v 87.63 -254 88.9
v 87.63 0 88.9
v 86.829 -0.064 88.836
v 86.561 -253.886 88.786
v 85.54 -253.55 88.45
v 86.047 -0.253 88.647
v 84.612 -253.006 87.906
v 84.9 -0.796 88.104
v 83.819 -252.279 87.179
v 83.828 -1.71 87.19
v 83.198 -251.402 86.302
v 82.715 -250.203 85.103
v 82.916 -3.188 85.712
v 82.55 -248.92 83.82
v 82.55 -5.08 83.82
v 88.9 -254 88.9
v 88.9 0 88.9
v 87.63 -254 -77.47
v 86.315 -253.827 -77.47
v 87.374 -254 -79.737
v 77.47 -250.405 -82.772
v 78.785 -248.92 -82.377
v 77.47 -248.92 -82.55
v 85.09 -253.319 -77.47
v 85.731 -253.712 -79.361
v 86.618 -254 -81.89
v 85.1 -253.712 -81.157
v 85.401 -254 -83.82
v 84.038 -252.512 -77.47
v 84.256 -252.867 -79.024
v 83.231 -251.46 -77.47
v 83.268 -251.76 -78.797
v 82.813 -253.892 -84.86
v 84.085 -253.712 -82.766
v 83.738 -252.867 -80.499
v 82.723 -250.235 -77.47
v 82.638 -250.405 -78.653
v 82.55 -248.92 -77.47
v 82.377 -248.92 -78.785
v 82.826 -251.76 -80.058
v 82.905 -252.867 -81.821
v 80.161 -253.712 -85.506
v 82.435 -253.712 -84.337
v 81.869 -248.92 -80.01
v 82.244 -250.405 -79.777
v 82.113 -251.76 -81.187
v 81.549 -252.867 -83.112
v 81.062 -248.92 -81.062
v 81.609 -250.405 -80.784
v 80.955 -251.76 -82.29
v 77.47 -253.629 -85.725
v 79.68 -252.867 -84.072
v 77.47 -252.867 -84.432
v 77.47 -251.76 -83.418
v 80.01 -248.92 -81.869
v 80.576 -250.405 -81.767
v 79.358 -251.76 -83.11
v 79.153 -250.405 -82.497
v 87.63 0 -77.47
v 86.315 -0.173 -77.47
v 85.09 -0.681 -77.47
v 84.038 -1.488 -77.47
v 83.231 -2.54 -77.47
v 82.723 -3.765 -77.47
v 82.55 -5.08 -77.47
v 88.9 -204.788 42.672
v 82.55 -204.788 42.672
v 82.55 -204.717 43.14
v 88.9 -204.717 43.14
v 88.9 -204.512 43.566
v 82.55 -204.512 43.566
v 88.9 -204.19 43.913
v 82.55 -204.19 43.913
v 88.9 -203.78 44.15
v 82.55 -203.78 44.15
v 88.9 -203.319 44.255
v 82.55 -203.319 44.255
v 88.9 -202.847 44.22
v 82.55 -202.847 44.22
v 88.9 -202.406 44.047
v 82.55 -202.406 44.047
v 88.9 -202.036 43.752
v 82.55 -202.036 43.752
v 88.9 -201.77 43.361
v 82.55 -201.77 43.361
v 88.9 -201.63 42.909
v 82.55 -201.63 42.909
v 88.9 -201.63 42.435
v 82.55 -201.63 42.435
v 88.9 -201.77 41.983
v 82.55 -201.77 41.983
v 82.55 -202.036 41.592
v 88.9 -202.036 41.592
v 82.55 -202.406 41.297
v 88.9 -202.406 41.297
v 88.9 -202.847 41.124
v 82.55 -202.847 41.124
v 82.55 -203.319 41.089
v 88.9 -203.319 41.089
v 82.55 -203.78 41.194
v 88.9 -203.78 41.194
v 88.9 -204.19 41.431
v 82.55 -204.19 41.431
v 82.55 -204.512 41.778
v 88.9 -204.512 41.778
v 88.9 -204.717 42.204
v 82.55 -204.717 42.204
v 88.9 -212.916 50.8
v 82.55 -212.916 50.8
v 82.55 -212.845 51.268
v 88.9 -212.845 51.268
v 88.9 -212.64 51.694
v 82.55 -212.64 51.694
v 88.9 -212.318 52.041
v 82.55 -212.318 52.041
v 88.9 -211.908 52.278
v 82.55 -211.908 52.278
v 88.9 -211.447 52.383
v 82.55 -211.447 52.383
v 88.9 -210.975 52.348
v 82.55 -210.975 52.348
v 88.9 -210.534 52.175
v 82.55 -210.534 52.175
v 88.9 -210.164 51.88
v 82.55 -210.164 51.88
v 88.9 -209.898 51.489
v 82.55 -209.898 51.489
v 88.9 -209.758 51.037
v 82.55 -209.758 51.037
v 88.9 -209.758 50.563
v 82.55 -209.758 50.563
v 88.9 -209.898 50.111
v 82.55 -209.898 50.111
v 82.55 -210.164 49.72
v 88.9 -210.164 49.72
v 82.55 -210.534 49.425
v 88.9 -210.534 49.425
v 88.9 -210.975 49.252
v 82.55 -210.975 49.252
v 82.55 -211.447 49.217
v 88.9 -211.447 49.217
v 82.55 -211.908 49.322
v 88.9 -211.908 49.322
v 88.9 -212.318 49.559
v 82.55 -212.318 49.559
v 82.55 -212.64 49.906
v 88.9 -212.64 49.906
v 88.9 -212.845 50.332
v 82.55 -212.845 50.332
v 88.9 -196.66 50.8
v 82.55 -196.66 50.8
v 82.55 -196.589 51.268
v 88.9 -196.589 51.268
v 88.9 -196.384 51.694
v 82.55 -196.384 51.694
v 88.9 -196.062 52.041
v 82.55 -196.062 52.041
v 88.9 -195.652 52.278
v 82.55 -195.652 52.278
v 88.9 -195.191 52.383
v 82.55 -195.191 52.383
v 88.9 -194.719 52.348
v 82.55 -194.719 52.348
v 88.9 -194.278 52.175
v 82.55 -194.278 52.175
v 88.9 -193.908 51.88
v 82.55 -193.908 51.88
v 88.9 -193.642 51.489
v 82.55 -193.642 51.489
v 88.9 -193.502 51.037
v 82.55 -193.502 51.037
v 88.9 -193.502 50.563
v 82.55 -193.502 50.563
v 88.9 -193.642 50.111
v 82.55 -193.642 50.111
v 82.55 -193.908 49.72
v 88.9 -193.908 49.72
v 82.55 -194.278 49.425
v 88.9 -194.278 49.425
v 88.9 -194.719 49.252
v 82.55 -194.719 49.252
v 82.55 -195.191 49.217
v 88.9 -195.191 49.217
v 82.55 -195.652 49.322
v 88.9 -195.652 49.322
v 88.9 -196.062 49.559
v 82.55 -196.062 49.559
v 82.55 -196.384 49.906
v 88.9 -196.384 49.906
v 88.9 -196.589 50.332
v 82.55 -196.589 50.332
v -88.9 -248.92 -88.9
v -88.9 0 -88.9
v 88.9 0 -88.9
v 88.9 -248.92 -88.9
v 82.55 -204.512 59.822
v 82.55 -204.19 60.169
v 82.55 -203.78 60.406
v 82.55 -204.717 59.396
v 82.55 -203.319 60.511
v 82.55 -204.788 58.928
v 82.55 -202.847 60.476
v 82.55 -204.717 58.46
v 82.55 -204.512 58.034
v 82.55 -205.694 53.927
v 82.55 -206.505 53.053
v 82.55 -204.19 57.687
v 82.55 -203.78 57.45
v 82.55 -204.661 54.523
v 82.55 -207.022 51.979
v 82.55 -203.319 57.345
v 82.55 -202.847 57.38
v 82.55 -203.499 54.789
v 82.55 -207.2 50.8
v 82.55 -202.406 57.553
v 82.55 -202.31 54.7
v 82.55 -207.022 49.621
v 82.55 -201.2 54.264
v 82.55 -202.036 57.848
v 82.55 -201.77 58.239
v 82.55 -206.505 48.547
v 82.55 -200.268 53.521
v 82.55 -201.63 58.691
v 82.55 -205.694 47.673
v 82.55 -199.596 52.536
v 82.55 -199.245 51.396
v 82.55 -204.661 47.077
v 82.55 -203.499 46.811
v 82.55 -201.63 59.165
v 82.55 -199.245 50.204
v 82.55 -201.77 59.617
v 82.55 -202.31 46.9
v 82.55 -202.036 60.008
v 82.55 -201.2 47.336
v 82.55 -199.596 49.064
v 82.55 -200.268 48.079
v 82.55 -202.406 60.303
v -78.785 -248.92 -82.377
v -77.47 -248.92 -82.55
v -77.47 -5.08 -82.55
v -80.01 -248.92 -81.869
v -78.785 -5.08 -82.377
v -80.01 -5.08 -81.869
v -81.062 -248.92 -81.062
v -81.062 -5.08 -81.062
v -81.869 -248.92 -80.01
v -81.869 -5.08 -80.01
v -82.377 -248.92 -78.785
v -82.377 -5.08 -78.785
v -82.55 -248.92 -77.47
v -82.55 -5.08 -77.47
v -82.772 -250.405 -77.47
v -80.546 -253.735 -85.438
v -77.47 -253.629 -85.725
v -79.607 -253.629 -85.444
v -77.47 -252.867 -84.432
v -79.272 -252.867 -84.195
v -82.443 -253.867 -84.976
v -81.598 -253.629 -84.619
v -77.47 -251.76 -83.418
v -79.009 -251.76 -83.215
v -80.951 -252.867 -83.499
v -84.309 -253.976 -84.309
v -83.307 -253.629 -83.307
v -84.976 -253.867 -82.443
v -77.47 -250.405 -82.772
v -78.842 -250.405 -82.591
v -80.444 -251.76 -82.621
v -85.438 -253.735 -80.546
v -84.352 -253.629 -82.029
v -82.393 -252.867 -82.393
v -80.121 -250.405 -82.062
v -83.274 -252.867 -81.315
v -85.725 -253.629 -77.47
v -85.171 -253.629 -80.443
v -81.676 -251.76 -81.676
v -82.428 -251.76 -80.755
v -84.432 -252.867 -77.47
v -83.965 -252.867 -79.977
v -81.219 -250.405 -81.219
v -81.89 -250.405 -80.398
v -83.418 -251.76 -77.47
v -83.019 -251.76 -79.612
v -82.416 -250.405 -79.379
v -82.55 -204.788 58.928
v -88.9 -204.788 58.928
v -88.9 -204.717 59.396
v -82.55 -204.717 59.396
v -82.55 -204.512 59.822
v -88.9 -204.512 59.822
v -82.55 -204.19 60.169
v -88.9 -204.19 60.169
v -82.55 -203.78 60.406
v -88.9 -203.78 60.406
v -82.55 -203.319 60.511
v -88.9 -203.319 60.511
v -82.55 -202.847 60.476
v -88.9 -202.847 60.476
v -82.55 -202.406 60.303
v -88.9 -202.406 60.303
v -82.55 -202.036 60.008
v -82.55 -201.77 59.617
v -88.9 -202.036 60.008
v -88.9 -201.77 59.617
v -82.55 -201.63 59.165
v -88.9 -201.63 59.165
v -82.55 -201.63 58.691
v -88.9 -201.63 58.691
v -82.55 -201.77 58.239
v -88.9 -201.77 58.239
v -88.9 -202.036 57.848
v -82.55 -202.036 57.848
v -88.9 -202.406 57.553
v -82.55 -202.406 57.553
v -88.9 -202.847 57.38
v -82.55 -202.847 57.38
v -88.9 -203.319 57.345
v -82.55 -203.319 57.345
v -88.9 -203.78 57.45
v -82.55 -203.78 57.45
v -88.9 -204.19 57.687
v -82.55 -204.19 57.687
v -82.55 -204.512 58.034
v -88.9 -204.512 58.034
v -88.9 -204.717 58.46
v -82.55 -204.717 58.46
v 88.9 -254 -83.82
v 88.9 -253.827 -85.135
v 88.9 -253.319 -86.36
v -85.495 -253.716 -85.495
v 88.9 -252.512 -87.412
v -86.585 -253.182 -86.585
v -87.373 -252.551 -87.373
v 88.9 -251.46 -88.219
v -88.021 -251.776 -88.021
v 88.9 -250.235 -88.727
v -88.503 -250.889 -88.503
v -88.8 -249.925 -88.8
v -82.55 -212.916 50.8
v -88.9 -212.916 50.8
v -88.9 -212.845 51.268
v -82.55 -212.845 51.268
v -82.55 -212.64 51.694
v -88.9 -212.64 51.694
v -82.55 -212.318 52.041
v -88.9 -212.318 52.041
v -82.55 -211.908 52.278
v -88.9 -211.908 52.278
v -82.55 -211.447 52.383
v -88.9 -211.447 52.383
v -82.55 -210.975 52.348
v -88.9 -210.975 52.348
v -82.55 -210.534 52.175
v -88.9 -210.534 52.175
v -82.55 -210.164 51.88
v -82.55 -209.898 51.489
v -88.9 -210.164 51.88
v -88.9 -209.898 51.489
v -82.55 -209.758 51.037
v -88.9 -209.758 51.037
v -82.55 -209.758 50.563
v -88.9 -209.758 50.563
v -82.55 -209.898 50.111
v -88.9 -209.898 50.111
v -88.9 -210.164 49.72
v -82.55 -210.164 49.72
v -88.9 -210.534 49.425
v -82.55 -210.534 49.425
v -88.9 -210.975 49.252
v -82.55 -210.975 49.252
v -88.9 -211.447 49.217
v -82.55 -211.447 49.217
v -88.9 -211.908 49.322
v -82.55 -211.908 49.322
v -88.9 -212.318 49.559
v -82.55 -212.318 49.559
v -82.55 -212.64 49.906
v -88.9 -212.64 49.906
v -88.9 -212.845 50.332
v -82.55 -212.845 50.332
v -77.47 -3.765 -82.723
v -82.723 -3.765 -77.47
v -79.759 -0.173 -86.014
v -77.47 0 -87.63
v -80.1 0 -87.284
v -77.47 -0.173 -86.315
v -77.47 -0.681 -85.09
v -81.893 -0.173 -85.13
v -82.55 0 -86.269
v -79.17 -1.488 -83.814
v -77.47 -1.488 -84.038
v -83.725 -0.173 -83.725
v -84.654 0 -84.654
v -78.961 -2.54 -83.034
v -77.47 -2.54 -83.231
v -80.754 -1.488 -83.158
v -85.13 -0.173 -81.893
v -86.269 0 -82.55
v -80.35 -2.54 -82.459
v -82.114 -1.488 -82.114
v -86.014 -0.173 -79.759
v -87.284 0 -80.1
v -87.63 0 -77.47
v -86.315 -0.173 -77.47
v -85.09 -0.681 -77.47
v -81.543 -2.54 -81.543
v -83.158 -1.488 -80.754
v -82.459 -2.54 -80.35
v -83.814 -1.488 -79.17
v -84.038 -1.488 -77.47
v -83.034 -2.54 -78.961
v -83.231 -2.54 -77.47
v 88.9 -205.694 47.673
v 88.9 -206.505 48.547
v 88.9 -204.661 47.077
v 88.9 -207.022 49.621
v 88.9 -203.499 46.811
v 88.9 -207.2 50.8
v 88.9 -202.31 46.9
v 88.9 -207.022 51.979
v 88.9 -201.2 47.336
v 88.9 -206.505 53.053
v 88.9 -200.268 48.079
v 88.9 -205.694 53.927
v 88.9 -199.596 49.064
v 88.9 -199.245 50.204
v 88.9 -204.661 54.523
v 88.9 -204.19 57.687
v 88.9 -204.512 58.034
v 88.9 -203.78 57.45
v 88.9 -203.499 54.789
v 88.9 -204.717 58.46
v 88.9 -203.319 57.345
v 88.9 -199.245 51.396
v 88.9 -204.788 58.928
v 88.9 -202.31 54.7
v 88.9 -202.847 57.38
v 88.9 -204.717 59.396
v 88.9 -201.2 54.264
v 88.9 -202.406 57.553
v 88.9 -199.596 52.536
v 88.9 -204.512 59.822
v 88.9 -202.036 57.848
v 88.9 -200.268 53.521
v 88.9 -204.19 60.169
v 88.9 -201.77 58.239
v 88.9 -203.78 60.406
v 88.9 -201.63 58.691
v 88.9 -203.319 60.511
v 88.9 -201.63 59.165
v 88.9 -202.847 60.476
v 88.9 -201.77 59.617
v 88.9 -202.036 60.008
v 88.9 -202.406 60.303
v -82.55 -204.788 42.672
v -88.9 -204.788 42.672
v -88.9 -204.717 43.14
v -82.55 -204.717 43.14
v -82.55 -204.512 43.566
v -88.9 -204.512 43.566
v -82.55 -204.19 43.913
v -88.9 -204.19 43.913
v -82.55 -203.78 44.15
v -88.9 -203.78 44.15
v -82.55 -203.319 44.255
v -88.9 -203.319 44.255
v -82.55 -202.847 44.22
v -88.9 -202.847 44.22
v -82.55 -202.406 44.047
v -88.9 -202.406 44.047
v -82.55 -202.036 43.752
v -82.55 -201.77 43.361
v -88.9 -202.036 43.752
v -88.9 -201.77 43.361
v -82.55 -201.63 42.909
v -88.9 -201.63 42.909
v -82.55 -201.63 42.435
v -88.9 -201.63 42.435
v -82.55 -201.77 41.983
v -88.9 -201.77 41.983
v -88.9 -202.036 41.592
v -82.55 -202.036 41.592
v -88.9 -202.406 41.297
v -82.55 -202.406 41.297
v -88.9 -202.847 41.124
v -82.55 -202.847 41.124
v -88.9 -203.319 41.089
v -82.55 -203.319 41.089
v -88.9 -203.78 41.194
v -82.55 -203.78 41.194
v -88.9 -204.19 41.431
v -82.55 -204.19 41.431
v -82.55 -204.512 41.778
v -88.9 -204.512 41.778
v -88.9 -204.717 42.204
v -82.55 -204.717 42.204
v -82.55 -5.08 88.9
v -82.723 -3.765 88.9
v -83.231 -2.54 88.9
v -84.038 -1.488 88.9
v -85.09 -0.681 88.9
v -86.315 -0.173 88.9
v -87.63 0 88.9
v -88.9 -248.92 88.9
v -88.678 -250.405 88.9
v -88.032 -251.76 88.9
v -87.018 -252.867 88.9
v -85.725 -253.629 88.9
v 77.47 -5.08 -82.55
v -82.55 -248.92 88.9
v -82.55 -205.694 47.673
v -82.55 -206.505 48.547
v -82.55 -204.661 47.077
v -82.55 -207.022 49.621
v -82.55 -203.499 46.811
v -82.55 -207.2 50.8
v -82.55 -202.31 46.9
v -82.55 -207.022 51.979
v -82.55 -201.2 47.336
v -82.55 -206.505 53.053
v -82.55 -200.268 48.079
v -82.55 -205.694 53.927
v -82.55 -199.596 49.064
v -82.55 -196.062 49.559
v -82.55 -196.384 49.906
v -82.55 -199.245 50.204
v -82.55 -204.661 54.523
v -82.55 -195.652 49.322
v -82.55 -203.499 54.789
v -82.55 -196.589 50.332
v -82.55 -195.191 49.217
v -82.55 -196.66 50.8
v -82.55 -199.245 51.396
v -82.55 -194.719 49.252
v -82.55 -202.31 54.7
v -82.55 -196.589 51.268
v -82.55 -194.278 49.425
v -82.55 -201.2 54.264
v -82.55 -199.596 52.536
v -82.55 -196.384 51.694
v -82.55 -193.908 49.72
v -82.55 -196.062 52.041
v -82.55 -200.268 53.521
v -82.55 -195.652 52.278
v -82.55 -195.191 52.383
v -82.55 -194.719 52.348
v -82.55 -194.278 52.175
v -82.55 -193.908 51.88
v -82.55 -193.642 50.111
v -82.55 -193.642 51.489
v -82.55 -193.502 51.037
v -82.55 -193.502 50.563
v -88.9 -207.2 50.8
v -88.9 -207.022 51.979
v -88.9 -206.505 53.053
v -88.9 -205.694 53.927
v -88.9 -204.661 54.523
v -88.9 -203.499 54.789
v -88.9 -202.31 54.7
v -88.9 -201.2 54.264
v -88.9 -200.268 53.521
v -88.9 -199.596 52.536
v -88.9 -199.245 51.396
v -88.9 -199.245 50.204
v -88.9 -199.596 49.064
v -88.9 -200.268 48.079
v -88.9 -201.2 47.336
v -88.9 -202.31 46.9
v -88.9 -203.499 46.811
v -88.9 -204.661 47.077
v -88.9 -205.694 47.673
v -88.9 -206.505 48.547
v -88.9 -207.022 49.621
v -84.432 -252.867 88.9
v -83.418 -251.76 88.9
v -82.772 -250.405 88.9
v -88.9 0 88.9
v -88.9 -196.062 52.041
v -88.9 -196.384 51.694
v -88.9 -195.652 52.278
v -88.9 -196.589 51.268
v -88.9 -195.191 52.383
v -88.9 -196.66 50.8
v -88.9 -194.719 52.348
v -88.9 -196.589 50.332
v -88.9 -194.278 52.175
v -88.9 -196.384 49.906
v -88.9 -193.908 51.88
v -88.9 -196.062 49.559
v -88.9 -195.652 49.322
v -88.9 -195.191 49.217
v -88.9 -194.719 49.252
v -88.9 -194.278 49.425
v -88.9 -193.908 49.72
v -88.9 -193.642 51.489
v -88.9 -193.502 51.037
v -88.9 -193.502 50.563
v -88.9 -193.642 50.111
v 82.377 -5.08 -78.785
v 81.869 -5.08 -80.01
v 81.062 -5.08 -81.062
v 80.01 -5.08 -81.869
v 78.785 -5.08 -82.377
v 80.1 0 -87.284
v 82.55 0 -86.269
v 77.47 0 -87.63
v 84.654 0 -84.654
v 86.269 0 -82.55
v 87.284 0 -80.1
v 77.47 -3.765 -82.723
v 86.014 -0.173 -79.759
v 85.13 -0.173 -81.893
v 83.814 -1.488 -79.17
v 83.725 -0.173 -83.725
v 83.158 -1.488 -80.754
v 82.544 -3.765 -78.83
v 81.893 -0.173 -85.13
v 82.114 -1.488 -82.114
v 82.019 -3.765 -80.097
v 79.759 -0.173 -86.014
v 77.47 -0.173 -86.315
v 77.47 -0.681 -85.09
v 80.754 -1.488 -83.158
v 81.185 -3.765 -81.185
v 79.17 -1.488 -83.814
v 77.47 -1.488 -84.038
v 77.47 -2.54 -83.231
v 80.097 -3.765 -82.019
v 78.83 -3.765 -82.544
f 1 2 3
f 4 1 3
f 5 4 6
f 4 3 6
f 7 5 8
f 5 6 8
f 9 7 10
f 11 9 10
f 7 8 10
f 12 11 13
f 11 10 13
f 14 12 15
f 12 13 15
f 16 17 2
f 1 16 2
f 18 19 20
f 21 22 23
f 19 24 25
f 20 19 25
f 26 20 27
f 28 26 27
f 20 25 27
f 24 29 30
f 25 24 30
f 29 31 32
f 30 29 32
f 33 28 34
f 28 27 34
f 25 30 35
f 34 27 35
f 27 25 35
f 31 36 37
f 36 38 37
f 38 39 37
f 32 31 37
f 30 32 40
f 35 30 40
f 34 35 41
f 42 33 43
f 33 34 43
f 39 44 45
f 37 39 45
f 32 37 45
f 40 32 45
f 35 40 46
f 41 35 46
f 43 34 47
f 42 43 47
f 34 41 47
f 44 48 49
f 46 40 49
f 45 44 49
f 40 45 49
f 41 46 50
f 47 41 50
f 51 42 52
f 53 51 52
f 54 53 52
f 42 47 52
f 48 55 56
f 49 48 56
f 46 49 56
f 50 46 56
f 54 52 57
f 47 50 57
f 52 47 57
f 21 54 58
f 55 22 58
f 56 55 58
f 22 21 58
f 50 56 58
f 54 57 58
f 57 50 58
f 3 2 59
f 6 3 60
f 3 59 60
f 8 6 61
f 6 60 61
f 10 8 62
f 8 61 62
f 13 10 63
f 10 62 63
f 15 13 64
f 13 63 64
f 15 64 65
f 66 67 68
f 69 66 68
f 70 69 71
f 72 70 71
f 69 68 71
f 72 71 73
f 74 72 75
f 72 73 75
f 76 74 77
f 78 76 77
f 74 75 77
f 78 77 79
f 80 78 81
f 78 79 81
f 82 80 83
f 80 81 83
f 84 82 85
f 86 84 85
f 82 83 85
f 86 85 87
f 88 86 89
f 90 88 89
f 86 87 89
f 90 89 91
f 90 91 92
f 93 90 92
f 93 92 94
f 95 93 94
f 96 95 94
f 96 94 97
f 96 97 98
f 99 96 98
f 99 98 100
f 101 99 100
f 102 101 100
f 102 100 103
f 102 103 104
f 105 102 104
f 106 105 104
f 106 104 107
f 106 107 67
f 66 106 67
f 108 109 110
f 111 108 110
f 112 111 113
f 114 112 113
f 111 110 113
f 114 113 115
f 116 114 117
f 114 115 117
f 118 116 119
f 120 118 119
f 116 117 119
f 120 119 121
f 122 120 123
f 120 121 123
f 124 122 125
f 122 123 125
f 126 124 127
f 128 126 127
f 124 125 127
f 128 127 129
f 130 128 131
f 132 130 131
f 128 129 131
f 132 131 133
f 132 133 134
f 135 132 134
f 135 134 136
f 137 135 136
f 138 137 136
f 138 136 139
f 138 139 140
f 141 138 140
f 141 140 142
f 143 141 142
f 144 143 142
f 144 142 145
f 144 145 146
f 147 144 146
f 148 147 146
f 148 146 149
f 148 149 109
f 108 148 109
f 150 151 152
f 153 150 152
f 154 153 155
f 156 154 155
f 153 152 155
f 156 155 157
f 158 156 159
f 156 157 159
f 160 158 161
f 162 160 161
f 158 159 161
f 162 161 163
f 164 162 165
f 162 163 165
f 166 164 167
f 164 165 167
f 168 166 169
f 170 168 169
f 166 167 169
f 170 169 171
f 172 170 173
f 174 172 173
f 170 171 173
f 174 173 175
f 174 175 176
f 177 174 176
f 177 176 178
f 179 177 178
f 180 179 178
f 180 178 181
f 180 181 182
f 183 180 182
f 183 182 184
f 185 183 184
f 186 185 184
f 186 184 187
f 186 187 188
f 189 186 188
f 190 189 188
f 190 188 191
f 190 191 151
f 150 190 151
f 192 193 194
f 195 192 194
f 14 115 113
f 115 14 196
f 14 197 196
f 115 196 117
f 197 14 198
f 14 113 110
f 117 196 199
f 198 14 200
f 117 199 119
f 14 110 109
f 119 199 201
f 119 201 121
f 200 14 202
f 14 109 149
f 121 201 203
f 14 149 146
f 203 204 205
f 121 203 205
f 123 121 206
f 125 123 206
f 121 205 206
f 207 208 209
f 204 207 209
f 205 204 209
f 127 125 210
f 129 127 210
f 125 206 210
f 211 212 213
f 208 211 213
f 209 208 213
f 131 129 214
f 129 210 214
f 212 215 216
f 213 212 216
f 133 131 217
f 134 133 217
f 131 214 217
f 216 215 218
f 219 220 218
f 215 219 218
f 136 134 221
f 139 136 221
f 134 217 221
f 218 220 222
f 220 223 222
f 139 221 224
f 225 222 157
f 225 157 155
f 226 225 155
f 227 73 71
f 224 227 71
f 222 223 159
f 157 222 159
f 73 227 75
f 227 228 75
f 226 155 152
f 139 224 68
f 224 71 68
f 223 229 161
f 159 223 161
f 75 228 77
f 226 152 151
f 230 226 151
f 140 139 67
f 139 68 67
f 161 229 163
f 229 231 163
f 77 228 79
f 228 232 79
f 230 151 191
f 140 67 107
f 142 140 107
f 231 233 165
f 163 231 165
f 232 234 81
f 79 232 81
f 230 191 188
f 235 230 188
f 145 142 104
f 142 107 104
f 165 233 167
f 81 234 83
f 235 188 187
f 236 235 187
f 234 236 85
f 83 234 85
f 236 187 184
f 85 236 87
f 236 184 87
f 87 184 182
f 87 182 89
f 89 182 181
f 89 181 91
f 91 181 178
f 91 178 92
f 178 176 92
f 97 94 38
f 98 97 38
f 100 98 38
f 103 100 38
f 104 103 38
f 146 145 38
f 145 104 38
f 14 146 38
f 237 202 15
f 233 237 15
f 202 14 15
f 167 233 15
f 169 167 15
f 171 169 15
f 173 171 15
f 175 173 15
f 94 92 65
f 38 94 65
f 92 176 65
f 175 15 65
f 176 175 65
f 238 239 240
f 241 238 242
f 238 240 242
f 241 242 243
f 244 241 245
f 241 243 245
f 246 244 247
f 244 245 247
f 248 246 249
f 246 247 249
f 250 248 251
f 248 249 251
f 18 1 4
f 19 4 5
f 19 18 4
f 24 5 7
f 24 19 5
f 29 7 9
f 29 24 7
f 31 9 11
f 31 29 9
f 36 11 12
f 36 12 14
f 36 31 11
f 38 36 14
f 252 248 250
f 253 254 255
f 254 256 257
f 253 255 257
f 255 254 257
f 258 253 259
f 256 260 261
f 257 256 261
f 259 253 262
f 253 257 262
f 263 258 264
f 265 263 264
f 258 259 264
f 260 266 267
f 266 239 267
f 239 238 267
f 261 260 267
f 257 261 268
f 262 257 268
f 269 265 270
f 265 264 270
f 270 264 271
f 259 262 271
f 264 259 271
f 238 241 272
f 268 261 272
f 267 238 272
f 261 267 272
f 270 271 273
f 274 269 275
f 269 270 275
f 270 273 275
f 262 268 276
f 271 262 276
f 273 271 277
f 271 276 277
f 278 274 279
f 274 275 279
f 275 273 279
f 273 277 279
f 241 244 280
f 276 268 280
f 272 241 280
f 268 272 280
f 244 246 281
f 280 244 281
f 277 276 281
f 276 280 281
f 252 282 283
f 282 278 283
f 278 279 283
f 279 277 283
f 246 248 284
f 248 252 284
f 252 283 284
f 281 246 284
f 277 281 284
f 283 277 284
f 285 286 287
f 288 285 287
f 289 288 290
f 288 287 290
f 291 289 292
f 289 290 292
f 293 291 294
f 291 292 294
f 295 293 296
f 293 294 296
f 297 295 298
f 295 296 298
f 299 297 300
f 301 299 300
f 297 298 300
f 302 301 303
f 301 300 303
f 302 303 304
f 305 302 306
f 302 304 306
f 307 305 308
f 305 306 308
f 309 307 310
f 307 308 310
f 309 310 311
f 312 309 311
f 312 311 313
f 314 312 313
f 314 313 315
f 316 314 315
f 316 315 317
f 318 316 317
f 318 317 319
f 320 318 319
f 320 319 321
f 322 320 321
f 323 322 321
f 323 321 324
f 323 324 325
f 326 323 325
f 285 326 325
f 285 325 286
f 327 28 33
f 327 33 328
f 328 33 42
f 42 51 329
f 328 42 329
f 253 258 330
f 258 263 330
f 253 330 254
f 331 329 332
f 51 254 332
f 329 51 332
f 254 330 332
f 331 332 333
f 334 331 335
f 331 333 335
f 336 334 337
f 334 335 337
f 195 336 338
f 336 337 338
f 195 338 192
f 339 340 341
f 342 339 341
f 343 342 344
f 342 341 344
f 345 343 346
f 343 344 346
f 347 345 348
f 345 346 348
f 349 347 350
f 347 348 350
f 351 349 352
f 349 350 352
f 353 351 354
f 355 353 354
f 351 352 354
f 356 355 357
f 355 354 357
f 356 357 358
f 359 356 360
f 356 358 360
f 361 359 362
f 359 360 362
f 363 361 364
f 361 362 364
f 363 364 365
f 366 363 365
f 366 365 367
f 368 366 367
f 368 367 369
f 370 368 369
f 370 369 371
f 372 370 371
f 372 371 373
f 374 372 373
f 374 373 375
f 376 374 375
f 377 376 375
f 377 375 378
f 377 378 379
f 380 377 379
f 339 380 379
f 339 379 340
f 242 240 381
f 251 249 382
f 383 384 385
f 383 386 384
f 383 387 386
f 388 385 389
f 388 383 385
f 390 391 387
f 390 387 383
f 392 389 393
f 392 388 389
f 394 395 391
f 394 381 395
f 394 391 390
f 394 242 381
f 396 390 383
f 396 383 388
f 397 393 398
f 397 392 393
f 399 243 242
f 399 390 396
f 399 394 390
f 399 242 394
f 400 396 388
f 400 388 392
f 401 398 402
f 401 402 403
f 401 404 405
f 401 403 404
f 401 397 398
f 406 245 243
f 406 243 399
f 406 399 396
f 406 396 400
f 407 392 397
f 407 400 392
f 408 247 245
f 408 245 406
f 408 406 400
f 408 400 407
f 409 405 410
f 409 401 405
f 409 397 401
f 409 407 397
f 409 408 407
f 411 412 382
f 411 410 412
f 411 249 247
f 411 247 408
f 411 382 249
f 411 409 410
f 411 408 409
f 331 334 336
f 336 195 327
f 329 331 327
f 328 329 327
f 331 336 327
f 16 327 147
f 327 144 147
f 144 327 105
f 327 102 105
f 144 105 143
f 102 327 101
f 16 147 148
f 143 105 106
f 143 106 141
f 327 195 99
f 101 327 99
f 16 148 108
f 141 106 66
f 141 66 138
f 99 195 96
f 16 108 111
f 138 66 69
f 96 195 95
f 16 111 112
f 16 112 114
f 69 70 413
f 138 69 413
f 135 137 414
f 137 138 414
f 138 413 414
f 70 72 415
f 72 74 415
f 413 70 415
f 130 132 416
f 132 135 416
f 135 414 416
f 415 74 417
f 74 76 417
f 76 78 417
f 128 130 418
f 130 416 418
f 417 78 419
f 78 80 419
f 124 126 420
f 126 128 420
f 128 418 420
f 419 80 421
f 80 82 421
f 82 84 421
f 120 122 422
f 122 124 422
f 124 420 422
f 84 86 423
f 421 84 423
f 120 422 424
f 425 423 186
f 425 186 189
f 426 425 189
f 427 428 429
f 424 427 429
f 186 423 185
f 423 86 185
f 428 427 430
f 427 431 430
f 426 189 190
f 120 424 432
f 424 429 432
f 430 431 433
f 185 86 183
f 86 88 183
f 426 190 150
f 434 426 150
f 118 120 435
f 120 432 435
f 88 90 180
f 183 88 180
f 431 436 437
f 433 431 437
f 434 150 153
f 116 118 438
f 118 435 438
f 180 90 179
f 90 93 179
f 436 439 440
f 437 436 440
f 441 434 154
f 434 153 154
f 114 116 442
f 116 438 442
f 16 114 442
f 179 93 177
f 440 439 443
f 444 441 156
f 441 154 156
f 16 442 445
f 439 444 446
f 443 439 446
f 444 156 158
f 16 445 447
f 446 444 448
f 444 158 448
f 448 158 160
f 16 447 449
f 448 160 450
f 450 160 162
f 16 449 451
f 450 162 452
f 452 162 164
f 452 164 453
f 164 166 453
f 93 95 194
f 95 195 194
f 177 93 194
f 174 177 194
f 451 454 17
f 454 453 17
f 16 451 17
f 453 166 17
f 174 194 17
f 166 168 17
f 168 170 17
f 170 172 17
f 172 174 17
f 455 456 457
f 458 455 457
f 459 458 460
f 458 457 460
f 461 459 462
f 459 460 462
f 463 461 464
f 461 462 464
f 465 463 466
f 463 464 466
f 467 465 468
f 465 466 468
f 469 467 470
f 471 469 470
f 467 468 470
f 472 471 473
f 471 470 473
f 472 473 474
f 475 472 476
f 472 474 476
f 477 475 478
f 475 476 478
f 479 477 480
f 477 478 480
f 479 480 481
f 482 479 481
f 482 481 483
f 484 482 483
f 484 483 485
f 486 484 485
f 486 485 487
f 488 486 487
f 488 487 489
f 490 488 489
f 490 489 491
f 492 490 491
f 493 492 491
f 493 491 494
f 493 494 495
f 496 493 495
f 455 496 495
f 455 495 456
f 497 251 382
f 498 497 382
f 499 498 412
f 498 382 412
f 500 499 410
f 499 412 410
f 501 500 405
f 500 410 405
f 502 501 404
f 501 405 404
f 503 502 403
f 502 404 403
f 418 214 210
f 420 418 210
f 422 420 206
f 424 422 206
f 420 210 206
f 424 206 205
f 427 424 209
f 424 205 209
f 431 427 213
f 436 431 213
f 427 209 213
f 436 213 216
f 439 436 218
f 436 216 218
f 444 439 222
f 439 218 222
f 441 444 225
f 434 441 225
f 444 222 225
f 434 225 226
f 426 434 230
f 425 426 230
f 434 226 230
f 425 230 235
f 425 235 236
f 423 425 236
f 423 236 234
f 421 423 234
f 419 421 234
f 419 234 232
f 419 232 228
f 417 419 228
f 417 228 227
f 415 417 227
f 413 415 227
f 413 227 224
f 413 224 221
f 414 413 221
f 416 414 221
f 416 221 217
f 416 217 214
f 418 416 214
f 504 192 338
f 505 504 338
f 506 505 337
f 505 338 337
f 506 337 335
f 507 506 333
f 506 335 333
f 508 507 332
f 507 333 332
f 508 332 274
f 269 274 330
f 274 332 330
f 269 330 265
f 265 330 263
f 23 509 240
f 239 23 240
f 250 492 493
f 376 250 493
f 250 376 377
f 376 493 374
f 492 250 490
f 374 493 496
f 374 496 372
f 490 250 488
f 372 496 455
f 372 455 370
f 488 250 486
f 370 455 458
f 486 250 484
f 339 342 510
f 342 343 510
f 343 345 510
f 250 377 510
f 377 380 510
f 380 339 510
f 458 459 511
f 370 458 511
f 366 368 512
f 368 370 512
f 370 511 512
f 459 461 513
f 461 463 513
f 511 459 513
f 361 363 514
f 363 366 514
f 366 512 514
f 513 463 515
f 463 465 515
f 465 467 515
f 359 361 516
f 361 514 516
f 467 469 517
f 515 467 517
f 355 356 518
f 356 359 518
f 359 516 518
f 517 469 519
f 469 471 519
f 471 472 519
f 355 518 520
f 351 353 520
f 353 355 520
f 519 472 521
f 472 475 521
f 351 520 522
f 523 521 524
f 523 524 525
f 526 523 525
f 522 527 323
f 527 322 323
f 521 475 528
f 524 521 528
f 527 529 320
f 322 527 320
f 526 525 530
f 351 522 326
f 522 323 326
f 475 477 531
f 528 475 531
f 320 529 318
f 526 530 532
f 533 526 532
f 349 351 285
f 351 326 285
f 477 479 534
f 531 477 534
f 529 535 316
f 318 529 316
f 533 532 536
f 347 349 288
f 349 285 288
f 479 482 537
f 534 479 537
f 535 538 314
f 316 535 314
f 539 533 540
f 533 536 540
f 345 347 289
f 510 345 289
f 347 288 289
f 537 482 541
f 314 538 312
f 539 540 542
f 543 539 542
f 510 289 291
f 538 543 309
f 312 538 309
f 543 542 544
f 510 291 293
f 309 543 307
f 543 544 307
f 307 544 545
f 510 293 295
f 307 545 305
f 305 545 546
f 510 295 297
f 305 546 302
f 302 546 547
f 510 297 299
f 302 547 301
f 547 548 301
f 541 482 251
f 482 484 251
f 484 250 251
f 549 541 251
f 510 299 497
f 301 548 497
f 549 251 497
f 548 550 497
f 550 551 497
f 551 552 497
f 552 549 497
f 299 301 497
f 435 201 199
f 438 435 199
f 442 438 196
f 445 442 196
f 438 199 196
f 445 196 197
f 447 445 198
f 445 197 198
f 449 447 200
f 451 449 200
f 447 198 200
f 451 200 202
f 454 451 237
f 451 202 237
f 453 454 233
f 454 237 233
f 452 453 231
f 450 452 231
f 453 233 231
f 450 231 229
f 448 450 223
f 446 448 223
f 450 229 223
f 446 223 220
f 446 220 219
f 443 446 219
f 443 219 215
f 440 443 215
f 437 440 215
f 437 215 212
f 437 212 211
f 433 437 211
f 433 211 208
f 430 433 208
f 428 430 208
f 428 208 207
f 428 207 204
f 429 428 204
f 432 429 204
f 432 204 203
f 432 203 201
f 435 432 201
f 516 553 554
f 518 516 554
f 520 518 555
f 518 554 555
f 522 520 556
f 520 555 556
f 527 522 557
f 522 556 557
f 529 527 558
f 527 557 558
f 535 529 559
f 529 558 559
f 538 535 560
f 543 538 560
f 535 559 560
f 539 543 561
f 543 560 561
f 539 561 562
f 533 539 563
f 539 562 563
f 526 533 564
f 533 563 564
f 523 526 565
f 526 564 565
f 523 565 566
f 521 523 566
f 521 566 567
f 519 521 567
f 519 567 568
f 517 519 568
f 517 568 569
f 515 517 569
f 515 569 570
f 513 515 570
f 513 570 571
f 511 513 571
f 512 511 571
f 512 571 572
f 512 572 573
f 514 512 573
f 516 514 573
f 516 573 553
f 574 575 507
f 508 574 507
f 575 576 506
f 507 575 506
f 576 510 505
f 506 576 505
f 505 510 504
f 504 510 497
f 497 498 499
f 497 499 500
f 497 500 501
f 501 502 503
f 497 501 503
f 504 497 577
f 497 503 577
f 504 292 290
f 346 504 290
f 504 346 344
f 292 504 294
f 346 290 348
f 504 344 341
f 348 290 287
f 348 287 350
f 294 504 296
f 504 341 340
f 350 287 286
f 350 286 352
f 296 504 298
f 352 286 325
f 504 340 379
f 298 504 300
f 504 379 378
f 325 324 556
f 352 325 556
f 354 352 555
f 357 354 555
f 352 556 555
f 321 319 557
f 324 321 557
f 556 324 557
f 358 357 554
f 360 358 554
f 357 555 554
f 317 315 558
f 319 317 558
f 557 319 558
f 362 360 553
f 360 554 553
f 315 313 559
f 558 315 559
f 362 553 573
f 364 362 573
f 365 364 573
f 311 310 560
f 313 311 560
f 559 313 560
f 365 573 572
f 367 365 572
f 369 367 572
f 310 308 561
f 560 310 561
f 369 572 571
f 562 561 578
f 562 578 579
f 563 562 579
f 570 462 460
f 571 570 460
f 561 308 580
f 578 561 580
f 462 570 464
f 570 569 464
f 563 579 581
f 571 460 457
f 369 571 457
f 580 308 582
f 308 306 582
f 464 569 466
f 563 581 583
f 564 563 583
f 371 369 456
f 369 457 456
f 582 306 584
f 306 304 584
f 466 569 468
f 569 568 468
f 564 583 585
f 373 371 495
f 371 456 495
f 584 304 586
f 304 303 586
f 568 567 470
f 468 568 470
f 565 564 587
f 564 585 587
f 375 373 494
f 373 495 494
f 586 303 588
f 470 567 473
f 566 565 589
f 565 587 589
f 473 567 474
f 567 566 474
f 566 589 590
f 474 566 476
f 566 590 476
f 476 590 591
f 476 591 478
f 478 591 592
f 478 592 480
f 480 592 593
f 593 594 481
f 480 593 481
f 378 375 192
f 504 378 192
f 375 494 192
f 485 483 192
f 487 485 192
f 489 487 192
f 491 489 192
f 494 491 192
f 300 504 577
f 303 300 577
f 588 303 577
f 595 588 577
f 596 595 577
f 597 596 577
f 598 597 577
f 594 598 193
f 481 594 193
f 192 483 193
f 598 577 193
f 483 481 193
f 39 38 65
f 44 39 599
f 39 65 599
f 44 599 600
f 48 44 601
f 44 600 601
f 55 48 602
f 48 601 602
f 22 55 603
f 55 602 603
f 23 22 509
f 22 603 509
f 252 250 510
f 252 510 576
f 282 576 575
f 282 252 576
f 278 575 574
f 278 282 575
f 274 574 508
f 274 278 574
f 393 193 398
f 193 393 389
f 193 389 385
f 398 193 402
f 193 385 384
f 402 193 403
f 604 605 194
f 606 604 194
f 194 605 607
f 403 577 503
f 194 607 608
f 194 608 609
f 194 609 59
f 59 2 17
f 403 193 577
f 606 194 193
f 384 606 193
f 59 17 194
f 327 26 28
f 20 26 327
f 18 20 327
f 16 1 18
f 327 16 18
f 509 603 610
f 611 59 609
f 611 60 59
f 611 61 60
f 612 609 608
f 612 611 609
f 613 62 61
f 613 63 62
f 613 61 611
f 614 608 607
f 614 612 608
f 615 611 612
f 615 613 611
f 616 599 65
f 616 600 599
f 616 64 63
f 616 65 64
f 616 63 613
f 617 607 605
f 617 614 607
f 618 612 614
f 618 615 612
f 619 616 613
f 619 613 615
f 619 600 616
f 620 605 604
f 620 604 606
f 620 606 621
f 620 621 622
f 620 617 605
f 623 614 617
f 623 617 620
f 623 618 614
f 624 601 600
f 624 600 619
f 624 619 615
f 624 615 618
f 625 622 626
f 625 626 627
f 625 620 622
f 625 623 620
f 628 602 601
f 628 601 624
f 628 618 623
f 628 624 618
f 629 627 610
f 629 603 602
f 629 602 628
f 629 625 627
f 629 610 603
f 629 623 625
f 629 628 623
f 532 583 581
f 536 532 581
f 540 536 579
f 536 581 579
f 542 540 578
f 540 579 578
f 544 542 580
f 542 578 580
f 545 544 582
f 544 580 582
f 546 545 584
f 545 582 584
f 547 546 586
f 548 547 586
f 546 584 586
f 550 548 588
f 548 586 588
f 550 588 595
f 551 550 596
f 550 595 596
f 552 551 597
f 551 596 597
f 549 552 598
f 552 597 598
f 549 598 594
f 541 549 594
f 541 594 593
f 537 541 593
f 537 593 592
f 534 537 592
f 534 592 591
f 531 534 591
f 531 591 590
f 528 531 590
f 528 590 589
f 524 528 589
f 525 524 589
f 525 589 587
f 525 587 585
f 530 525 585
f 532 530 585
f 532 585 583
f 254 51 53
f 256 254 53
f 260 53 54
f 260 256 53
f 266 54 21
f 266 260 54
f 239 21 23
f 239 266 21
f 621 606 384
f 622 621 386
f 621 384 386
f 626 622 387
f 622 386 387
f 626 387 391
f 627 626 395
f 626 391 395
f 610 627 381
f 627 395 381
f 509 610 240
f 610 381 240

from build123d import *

# Parameters (mm, degrees)
F1_DEPTH     = 254
F2_T1_DEPTH  = 254
F2_T3_DEPTH  = 203.2
F2_T5_DEPTH  = 179.07
F2_T7_DEPTH  = 279.4
F2_T9_DEPTH  = 154.94
F2_T11_DEPTH = 203.2
F2_T14_ANGLE = 90
F2_T16_ANGLE = 90
F2_T18_ANGLE = 90
F2_T20_ANGLE = 90
F3_R         = 4.0000047
F3_R_2       = 1.5875
F4_DEPTH     = 203.2


# Not quite as in the source:
# - a fillet or chamfer that OpenCascade refuses, or shapes differently, is made with other operations: its cross-section is extruded or revolved along the edge and cut away or added


with BuildPart() as f1:
    # F0 (on Front) → F1 (new body)
    with BuildSketch(Plane.XZ):
        Polygon((-88.9, -88.9), (88.9, -88.9), (88.9, 88.9), (82.55, 88.9), (82.55, -82.55), (-82.55, -82.55), (-82.55, 88.9), (-88.9, 88.9), align=None)
    extrude(amount=F1_DEPTH)

    # F2: fillet of radius 5.08 on 11 edges, made by hand

    # F2_s2 → F2_t1 (join)
    with BuildSketch(Plane.XZ):
        with BuildLine():
            ThreePointArc((82.55, -77.47), (81.0621024484, -81.0621024484), (77.47, -82.55))
            Line((77.47, -82.55), (82.55, -82.55))
            Line((82.55, -82.55), (82.55, -77.47))
        make_face()
        with BuildLine():
            ThreePointArc((-77.47, -82.55), (-81.0621024484, -81.0621024484), (-82.55, -77.47))
            Line((-82.55, -77.47), (-82.55, -82.55))
            Line((-82.55, -82.55), (-77.47, -82.55))
        make_face()
    extrude(amount=F2_T1_DEPTH)

    # F2_s4 → F2_t3 (cut)
    with BuildSketch(Plane.YZ.offset(-101.6)):
        with BuildLine():
            ThreePointArc((-254, -83.82), (-252.5121024484, -87.4121024484), (-248.92, -88.9))
            Line((-248.92, -88.9), (-254, -88.9))
            Line((-254, -88.9), (-254, -83.82))
        make_face()
    extrude(amount=F2_T3_DEPTH, mode=Mode.SUBTRACT)

    # F2_s6 → F2_t5 (cut)
    with BuildSketch(Plane.XY.offset(-77.47)):
        with BuildLine():
            ThreePointArc((-82.55, -248.92), (-84.0378975516, -252.5121024484), (-87.63, -254))
            Line((-87.63, -254), (-82.55, -254))
            Line((-82.55, -254), (-82.55, -248.92))
        make_face()
        with BuildLine():
            ThreePointArc((87.63, 0), (84.0378975516, -1.4878975516), (82.55, -5.08))
            Line((82.55, -5.08), (82.55, 0))
            Line((82.55, 0), (87.63, 0))
        make_face()
        with BuildLine():
            ThreePointArc((87.63, -254), (84.0378975516, -252.5121024484), (82.55, -248.92))
            Line((82.55, -248.92), (82.55, -254))
            Line((82.55, -254), (87.63, -254))
        make_face()
        with BuildLine():
            ThreePointArc((-82.55, -5.08), (-84.0378975516, -1.4878975516), (-87.63, 0))
            Line((-87.63, 0), (-82.55, 0))
            Line((-82.55, 0), (-82.55, -5.08))
        make_face()
    extrude(amount=F2_T5_DEPTH, mode=Mode.SUBTRACT)

    # F2_s8 → F2_t7 (cut)
    with BuildSketch(Plane.XZ.offset(-12.7)):
        with BuildLine():
            ThreePointArc((87.63, 88.9), (84.0378975516, 87.4121024484), (82.55, 83.82))
            Line((82.55, 83.82), (82.55, 88.9))
            Line((82.55, 88.9), (87.63, 88.9))
        make_face()
    extrude(amount=F2_T7_DEPTH, mode=Mode.SUBTRACT)

    # F2_s10 → F2_t9 (cut)
    with BuildSketch(Plane.YZ.offset(-77.47)):
        with BuildLine():
            ThreePointArc((0, -87.63), (-1.4878975516, -84.0378975516), (-5.08, -82.55))
            Line((-5.08, -82.55), (0, -82.55))
            Line((0, -82.55), (0, -87.63))
        make_face()
        with BuildLine():
            ThreePointArc((-254, -87.63), (-252.5121024484, -84.0378975516), (-248.92, -82.55))
            Line((-248.92, -82.55), (-254, -82.55))
            Line((-254, -82.55), (-254, -87.63))
        make_face()
    extrude(amount=F2_T9_DEPTH, mode=Mode.SUBTRACT)

    # F2_s12 → F2_t11 (cut)
    with BuildSketch(Plane.XY.offset(-101.6)):
        with BuildLine():
            ThreePointArc((-88.9, -248.92), (-87.4121024484, -252.5121024484), (-83.82, -254))
            Line((-83.82, -254), (-88.9, -254))
            Line((-88.9, -254), (-88.9, -248.92))
        make_face()
    extrude(amount=F2_T11_DEPTH, mode=Mode.SUBTRACT)

    # F2_s13 → F2_t14 (revolve, cut)
    with BuildSketch(Plane.YZ.offset(-77.47)):
        with BuildLine():
            ThreePointArc((0, -87.63), (-1.4878975516, -84.0378975516), (-5.08, -82.55))
            Line((-5.08, -82.55), (0, -82.55))
            Line((0, -82.55), (0, -87.63))
        make_face()
    revolve(axis=Axis((-77.47, 0, -77.47), (0, 1, 0)), revolution_arc=F2_T14_ANGLE, mode=Mode.SUBTRACT)

    # F2_s15 → F2_t16 (revolve, cut)
    with BuildSketch(Plane.XY.offset(-77.47)):
        with BuildLine():
            ThreePointArc((87.63, -254), (84.0378975516, -252.5121024484), (82.55, -248.92))
            Line((82.55, -248.92), (82.55, -254))
            Line((82.55, -254), (87.63, -254))
        make_face()
    revolve(axis=Axis((77.47, -254, -77.47), (0, 1, 0)), revolution_arc=F2_T16_ANGLE, mode=Mode.SUBTRACT)

    # F2_s17 → F2_t18 (revolve, cut)
    with BuildSketch(Plane.YZ.offset(-77.47)):
        with BuildLine():
            ThreePointArc((-254, -87.63), (-252.5121024484, -84.0378975516), (-248.92, -82.55))
            Line((-248.92, -82.55), (-254, -82.55))
            Line((-254, -82.55), (-254, -87.63))
        make_face()
    revolve(axis=Axis((-77.47, -254, -77.47), (0, 1, 0)), revolution_arc=F2_T18_ANGLE, mode=Mode.SUBTRACT)

    # F2_s19 → F2_t20 (revolve, cut)
    with BuildSketch(Plane.XY.offset(-77.47)):
        with BuildLine():
            ThreePointArc((87.63, 0), (84.0378975516, -1.4878975516), (82.55, -5.08))
            Line((82.55, -5.08), (82.55, 0))
            Line((82.55, 0), (87.63, 0))
        make_face()
    revolve(axis=Axis((77.47, 0, -77.47), (0, 1, 0)), revolution_arc=F2_T20_ANGLE, mode=Mode.SUBTRACT)

    # F3 (on face) → F4 (cut)
    with BuildSketch(Plane(origin=(-88.9, 0, 0), x_dir=(0, -1, 0), z_dir=(-1, 0, 0))):
        with Locations((203.2, 50.8)):
            Circle(F3_R)
        with Locations((211.328, 50.8)):
            Circle(F3_R_2)
        with Locations((203.2, 42.672)):
            Circle(F3_R_2)
        with Locations((195.072, 50.8)):
            Circle(F3_R_2)
        with Locations((203.2, 58.928)):
            Circle(F3_R_2)
    extrude(amount=-F4_DEPTH, mode=Mode.SUBTRACT)


solid = f1.part
